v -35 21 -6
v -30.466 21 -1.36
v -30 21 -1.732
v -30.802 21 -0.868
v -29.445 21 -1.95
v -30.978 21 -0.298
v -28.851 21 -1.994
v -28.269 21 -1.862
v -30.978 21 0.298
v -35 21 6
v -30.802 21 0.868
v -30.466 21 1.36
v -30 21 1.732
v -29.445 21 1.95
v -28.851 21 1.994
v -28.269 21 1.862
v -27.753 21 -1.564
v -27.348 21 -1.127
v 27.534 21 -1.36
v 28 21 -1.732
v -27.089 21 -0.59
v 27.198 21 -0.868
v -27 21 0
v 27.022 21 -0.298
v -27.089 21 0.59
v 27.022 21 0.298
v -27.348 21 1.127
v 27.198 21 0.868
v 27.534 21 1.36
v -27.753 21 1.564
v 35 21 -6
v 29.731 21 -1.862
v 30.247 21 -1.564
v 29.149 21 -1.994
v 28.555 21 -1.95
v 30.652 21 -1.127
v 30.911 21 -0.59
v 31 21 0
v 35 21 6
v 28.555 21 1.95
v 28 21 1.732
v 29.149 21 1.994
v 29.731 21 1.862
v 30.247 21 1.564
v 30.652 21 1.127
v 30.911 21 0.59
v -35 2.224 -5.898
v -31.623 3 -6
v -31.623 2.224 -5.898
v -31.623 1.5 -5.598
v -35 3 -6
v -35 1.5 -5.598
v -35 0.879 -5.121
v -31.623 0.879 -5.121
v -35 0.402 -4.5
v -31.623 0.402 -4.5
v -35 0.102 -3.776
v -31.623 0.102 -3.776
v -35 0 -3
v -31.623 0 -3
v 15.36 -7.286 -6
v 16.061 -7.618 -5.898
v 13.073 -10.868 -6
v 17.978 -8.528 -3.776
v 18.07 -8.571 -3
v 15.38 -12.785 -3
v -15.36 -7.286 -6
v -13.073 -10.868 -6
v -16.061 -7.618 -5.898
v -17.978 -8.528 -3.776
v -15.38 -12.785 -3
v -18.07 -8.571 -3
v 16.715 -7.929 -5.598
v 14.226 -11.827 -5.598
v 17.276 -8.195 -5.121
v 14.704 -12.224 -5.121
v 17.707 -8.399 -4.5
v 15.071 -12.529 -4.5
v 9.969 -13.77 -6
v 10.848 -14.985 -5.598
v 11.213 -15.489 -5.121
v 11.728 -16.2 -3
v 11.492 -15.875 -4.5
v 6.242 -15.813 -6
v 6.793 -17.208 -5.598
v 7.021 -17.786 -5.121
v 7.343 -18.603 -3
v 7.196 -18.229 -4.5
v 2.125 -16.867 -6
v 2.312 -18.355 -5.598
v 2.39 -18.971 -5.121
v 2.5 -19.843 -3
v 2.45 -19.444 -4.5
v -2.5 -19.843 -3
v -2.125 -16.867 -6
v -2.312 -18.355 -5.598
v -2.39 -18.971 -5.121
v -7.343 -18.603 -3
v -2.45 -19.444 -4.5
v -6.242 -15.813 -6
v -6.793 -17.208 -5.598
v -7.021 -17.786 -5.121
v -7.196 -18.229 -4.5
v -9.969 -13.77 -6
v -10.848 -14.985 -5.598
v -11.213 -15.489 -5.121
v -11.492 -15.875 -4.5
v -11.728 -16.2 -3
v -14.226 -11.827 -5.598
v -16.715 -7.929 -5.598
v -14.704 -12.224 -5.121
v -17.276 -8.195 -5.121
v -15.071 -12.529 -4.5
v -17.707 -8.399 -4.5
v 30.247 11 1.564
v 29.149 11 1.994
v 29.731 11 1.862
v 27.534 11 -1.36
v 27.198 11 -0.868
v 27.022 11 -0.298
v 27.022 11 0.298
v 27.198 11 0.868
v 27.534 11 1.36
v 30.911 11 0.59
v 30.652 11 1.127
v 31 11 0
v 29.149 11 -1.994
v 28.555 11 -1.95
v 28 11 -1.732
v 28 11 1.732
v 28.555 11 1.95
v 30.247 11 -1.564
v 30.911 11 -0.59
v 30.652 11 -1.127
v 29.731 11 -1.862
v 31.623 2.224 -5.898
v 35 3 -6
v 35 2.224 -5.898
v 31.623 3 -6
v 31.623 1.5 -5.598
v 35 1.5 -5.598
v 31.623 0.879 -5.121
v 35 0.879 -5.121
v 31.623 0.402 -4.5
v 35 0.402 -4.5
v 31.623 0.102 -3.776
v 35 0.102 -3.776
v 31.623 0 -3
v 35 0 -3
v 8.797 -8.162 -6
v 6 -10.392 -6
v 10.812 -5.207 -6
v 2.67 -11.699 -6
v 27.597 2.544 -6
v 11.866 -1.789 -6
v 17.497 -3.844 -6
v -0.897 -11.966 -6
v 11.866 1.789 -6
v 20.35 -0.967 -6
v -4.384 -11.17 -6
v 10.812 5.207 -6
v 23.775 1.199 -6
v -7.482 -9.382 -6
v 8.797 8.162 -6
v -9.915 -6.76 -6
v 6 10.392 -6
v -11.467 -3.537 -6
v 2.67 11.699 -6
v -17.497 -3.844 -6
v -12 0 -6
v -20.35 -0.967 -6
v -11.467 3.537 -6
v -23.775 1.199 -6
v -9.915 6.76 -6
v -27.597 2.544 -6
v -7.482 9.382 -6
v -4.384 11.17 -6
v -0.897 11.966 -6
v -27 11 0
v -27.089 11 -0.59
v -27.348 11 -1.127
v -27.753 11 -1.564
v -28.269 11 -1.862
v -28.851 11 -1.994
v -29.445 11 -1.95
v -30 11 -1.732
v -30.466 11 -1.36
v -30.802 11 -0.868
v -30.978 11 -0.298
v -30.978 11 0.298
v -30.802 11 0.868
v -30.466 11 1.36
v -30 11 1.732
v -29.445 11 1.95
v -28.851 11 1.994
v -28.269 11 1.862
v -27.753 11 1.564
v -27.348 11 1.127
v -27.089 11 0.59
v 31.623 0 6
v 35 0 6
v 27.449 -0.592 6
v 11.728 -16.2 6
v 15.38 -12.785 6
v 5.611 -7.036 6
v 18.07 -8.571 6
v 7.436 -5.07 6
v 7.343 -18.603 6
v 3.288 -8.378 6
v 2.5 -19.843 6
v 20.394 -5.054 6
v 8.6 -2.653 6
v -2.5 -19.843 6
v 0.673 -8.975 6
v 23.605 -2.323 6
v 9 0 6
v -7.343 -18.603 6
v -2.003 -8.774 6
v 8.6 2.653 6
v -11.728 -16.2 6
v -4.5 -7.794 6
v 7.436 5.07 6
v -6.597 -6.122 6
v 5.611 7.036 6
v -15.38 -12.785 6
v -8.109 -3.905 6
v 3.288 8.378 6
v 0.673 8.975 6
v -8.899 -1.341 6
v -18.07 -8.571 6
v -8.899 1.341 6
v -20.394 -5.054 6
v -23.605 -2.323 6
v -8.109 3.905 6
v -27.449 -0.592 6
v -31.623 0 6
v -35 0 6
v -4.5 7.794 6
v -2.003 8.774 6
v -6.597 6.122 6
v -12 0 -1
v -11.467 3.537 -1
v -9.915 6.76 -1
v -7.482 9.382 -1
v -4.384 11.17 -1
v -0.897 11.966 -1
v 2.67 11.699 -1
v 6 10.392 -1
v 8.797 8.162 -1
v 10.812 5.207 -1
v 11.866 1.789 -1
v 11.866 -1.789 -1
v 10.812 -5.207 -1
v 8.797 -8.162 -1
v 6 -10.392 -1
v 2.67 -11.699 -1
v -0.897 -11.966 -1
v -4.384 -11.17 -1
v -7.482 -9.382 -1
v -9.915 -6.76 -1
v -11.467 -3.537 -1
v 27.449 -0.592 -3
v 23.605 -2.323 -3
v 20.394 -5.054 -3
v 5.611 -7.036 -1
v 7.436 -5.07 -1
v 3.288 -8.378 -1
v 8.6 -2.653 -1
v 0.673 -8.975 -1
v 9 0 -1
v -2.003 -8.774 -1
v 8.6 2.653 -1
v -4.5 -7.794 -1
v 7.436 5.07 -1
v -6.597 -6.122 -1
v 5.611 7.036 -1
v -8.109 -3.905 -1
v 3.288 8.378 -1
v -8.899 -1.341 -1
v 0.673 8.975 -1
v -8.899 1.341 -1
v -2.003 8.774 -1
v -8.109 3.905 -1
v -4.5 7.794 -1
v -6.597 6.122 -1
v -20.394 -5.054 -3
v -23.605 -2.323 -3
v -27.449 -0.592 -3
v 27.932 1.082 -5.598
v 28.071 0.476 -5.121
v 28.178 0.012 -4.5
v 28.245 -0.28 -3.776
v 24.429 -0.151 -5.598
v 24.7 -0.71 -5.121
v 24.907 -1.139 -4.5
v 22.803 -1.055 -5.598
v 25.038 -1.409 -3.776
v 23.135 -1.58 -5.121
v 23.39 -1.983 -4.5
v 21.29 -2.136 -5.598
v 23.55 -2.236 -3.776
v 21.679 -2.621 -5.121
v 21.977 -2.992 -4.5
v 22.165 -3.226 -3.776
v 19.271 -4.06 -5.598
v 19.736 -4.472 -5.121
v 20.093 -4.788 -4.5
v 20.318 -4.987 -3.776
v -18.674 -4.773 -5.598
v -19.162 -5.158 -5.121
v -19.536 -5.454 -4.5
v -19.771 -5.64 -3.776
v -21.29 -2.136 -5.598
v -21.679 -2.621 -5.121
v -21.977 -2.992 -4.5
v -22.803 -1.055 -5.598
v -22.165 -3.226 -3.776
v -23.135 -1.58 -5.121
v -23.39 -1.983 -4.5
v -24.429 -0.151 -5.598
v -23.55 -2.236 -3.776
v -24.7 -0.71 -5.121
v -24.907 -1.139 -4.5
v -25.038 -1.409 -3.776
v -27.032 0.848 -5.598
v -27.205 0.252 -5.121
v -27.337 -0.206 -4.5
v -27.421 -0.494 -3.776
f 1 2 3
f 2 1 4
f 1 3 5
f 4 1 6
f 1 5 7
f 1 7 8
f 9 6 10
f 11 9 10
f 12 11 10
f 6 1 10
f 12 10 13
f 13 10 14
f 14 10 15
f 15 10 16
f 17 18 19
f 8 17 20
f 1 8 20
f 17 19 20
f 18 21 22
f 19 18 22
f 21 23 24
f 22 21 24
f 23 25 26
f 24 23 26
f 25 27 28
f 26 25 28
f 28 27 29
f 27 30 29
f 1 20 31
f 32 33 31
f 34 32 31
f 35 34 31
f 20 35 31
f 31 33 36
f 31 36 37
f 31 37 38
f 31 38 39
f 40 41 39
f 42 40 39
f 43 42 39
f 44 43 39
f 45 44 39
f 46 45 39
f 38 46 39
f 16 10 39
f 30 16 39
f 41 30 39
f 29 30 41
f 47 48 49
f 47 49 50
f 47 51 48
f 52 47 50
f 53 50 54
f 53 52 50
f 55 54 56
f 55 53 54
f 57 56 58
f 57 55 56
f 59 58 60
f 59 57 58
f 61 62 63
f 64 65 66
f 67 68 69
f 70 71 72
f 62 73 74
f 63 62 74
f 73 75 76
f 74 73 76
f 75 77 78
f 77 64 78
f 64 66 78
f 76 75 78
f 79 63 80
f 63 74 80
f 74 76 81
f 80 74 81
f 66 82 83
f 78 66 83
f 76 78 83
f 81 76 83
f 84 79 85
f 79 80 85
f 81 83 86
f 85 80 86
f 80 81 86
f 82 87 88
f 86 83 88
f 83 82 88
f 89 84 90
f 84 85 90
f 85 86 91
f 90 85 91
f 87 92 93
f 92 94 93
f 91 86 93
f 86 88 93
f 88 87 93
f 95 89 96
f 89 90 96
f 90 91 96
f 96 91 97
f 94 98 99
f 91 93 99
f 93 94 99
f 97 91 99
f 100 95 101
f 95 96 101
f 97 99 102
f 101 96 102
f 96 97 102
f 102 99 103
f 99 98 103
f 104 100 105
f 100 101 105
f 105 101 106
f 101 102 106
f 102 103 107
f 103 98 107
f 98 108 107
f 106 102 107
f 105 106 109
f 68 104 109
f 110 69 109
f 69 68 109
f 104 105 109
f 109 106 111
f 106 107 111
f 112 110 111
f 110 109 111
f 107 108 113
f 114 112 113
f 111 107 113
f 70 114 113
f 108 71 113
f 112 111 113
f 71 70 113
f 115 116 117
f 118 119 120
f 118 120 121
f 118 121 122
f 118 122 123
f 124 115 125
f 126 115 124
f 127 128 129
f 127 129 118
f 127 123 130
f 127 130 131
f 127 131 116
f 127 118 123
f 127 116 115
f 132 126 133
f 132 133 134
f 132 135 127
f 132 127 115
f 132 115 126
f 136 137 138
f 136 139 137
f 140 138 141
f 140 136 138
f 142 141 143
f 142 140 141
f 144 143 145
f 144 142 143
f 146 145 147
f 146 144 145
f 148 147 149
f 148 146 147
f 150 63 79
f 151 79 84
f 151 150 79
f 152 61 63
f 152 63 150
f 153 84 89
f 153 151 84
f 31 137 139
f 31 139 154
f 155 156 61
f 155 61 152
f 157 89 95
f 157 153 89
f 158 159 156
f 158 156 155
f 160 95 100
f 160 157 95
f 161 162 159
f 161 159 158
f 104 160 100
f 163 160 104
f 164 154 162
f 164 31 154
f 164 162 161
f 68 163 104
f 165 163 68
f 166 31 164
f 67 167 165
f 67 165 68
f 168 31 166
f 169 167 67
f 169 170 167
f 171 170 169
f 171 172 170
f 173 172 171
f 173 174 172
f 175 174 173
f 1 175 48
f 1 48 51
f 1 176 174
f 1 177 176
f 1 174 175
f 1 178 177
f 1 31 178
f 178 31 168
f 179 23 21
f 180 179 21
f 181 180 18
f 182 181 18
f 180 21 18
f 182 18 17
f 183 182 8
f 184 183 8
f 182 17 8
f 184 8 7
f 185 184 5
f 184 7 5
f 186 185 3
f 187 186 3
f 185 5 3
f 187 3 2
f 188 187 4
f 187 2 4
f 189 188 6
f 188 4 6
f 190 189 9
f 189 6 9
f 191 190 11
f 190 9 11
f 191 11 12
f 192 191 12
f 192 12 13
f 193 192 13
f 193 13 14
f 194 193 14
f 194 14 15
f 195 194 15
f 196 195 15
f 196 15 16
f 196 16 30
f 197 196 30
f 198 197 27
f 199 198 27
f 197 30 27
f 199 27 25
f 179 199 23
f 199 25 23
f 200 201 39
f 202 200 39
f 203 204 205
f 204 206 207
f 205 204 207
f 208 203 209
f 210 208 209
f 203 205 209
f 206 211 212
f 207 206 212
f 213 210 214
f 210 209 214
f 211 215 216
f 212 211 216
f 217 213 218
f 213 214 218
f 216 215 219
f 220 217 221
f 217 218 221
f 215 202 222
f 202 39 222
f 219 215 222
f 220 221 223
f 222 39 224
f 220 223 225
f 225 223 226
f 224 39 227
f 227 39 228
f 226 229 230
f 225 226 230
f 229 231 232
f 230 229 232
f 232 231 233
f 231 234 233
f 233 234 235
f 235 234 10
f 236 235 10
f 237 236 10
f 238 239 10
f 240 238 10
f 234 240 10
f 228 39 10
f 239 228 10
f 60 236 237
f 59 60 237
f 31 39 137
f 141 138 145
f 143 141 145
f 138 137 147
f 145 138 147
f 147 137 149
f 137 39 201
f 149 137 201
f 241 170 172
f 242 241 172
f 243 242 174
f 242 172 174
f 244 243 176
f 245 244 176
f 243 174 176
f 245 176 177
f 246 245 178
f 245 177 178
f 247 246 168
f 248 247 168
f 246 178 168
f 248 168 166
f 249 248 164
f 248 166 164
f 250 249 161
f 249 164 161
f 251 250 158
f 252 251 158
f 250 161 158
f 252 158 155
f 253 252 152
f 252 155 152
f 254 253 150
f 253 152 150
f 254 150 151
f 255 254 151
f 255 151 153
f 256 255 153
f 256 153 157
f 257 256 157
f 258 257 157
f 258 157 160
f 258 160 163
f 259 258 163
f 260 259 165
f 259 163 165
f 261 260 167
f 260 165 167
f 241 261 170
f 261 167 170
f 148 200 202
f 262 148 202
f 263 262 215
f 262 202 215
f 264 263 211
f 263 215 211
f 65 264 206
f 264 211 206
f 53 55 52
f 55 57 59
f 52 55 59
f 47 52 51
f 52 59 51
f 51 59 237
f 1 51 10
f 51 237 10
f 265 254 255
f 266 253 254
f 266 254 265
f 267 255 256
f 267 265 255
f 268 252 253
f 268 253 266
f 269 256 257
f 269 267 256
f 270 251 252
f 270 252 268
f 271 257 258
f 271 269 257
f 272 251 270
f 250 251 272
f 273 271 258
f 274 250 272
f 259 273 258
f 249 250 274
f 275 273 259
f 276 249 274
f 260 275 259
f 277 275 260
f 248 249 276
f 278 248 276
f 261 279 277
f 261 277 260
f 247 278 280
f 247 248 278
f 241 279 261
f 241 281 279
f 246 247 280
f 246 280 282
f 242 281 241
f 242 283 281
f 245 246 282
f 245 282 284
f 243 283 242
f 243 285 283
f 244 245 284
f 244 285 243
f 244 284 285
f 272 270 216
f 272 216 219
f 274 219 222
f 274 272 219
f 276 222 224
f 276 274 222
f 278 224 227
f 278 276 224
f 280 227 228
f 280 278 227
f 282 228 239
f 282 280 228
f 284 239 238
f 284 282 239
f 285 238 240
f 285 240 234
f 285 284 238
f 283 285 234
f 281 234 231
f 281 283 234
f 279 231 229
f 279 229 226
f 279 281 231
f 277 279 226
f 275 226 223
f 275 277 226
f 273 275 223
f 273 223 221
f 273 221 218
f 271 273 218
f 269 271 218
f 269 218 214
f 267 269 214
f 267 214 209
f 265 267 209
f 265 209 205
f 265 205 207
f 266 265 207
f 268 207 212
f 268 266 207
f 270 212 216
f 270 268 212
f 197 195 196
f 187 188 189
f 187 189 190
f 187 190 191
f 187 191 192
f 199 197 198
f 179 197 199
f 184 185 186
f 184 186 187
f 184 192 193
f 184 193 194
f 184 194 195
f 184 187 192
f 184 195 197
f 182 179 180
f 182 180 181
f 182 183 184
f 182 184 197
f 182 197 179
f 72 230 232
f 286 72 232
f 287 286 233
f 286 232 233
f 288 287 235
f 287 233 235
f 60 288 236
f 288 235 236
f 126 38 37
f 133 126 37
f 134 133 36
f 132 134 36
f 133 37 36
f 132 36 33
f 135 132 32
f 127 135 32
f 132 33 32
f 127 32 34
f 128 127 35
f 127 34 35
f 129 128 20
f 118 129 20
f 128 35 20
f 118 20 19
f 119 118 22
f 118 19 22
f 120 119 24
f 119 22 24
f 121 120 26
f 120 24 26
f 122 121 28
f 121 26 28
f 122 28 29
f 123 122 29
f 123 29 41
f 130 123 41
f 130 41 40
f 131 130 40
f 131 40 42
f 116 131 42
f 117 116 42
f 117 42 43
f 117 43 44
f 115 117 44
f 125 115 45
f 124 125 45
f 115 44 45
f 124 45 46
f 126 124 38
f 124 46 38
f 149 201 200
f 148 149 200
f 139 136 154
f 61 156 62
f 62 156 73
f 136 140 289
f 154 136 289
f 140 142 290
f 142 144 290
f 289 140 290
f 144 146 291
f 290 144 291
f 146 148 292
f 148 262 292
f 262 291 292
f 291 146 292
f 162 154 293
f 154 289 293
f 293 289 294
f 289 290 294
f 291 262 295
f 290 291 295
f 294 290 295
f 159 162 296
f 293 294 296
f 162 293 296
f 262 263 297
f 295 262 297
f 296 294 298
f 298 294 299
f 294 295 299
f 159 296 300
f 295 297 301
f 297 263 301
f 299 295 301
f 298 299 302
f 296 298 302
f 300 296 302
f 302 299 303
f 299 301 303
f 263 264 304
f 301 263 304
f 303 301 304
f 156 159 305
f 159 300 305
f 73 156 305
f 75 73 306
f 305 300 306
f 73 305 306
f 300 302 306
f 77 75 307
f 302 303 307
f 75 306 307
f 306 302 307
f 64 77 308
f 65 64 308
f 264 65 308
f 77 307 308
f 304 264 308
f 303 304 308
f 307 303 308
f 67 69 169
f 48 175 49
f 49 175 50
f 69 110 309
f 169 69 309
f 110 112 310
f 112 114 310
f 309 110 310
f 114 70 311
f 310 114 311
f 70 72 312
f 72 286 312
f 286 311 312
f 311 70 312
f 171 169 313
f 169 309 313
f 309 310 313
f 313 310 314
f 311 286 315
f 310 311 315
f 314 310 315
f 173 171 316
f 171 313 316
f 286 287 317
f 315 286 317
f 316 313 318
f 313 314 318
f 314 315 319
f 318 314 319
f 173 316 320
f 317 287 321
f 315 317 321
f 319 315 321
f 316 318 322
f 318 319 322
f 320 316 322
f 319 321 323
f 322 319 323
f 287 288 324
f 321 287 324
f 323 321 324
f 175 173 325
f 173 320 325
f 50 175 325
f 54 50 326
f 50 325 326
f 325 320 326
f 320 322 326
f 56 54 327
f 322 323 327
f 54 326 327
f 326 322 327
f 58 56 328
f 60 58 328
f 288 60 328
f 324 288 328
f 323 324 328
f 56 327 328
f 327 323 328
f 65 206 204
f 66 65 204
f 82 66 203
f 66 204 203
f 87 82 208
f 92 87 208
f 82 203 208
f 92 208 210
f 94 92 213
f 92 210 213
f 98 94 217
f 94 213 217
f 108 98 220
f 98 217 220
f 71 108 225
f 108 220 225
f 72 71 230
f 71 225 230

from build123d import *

# Parameters (mm, degrees)
SKETCH1_R           = 9
BOSS_EXTRUDE1_DEPTH = 6
SKETCH2_R           = 12
CUT_EXTRUDE1_DEPTH  = 5
SKETCH3_R           = 2
CUT_EXTRUDE2_DEPTH  = 10
FILLET1_R           = 3


with BuildPart() as part:
    # Sketch1 → Boss-Extrude1 (new body, symmetric)
    with BuildSketch(Plane.XY):
        with BuildLine():
            Line((-35, 21), (35, 21))
            Line((35, 21), (35, 0))
            Line((35, 0), (31.622776602, 0))
            ThreePointArc((31.622776602, 0), (23.604939344, -2.322686179), (18.070158058, -8.571428571))
            ThreePointArc((18.070158058, -8.571428571), (0, -20), (-18.070158058, -8.571428571))
            ThreePointArc((-18.070158058, -8.571428571), (-23.604939344, -2.322686179), (-31.622776602, 0))
            Line((-31.622776602, 0), (-35, 0))
            Line((-35, 0), (-35, 21))
        make_face()
        Circle(SKETCH1_R, mode=Mode.SUBTRACT)
    extrude(amount=BOSS_EXTRUDE1_DEPTH, both=True)

    # Sketch2 → Cut-Extrude1 (cut)
    with BuildSketch(Plane(origin=(0, 0, -6), x_dir=(-1, 0, 0), z_dir=(0, 0, -1))):
        Circle(SKETCH2_R)
    extrude(amount=-CUT_EXTRUDE1_DEPTH, mode=Mode.SUBTRACT)

    # Sketch3 → Cut-Extrude2 (cut)
    with BuildSketch(Plane(origin=(0, 21, 0), x_dir=(1, 0, 0), z_dir=(0, 1, 0))):
        with Locations((-29, 0)):
            Circle(SKETCH3_R)
        with Locations((29, 0)):
            Circle(SKETCH3_R)
    extrude(amount=-CUT_EXTRUDE2_DEPTH, mode=Mode.SUBTRACT)

    # Fillet1
    fillet1_edges = [part.edges().sort_by_distance(p)[0] for p in [
        (0, -20, -6),
        (-23.604939344, -2.322686179, -6),
        (-33.311388301, 0, -6),
        (33.311388301, 0, -6),
        (23.604939344, -2.322686179, -6),
    ]]
    fillet(fillet1_edges, radius=FILLET1_R)


solid = part.part
